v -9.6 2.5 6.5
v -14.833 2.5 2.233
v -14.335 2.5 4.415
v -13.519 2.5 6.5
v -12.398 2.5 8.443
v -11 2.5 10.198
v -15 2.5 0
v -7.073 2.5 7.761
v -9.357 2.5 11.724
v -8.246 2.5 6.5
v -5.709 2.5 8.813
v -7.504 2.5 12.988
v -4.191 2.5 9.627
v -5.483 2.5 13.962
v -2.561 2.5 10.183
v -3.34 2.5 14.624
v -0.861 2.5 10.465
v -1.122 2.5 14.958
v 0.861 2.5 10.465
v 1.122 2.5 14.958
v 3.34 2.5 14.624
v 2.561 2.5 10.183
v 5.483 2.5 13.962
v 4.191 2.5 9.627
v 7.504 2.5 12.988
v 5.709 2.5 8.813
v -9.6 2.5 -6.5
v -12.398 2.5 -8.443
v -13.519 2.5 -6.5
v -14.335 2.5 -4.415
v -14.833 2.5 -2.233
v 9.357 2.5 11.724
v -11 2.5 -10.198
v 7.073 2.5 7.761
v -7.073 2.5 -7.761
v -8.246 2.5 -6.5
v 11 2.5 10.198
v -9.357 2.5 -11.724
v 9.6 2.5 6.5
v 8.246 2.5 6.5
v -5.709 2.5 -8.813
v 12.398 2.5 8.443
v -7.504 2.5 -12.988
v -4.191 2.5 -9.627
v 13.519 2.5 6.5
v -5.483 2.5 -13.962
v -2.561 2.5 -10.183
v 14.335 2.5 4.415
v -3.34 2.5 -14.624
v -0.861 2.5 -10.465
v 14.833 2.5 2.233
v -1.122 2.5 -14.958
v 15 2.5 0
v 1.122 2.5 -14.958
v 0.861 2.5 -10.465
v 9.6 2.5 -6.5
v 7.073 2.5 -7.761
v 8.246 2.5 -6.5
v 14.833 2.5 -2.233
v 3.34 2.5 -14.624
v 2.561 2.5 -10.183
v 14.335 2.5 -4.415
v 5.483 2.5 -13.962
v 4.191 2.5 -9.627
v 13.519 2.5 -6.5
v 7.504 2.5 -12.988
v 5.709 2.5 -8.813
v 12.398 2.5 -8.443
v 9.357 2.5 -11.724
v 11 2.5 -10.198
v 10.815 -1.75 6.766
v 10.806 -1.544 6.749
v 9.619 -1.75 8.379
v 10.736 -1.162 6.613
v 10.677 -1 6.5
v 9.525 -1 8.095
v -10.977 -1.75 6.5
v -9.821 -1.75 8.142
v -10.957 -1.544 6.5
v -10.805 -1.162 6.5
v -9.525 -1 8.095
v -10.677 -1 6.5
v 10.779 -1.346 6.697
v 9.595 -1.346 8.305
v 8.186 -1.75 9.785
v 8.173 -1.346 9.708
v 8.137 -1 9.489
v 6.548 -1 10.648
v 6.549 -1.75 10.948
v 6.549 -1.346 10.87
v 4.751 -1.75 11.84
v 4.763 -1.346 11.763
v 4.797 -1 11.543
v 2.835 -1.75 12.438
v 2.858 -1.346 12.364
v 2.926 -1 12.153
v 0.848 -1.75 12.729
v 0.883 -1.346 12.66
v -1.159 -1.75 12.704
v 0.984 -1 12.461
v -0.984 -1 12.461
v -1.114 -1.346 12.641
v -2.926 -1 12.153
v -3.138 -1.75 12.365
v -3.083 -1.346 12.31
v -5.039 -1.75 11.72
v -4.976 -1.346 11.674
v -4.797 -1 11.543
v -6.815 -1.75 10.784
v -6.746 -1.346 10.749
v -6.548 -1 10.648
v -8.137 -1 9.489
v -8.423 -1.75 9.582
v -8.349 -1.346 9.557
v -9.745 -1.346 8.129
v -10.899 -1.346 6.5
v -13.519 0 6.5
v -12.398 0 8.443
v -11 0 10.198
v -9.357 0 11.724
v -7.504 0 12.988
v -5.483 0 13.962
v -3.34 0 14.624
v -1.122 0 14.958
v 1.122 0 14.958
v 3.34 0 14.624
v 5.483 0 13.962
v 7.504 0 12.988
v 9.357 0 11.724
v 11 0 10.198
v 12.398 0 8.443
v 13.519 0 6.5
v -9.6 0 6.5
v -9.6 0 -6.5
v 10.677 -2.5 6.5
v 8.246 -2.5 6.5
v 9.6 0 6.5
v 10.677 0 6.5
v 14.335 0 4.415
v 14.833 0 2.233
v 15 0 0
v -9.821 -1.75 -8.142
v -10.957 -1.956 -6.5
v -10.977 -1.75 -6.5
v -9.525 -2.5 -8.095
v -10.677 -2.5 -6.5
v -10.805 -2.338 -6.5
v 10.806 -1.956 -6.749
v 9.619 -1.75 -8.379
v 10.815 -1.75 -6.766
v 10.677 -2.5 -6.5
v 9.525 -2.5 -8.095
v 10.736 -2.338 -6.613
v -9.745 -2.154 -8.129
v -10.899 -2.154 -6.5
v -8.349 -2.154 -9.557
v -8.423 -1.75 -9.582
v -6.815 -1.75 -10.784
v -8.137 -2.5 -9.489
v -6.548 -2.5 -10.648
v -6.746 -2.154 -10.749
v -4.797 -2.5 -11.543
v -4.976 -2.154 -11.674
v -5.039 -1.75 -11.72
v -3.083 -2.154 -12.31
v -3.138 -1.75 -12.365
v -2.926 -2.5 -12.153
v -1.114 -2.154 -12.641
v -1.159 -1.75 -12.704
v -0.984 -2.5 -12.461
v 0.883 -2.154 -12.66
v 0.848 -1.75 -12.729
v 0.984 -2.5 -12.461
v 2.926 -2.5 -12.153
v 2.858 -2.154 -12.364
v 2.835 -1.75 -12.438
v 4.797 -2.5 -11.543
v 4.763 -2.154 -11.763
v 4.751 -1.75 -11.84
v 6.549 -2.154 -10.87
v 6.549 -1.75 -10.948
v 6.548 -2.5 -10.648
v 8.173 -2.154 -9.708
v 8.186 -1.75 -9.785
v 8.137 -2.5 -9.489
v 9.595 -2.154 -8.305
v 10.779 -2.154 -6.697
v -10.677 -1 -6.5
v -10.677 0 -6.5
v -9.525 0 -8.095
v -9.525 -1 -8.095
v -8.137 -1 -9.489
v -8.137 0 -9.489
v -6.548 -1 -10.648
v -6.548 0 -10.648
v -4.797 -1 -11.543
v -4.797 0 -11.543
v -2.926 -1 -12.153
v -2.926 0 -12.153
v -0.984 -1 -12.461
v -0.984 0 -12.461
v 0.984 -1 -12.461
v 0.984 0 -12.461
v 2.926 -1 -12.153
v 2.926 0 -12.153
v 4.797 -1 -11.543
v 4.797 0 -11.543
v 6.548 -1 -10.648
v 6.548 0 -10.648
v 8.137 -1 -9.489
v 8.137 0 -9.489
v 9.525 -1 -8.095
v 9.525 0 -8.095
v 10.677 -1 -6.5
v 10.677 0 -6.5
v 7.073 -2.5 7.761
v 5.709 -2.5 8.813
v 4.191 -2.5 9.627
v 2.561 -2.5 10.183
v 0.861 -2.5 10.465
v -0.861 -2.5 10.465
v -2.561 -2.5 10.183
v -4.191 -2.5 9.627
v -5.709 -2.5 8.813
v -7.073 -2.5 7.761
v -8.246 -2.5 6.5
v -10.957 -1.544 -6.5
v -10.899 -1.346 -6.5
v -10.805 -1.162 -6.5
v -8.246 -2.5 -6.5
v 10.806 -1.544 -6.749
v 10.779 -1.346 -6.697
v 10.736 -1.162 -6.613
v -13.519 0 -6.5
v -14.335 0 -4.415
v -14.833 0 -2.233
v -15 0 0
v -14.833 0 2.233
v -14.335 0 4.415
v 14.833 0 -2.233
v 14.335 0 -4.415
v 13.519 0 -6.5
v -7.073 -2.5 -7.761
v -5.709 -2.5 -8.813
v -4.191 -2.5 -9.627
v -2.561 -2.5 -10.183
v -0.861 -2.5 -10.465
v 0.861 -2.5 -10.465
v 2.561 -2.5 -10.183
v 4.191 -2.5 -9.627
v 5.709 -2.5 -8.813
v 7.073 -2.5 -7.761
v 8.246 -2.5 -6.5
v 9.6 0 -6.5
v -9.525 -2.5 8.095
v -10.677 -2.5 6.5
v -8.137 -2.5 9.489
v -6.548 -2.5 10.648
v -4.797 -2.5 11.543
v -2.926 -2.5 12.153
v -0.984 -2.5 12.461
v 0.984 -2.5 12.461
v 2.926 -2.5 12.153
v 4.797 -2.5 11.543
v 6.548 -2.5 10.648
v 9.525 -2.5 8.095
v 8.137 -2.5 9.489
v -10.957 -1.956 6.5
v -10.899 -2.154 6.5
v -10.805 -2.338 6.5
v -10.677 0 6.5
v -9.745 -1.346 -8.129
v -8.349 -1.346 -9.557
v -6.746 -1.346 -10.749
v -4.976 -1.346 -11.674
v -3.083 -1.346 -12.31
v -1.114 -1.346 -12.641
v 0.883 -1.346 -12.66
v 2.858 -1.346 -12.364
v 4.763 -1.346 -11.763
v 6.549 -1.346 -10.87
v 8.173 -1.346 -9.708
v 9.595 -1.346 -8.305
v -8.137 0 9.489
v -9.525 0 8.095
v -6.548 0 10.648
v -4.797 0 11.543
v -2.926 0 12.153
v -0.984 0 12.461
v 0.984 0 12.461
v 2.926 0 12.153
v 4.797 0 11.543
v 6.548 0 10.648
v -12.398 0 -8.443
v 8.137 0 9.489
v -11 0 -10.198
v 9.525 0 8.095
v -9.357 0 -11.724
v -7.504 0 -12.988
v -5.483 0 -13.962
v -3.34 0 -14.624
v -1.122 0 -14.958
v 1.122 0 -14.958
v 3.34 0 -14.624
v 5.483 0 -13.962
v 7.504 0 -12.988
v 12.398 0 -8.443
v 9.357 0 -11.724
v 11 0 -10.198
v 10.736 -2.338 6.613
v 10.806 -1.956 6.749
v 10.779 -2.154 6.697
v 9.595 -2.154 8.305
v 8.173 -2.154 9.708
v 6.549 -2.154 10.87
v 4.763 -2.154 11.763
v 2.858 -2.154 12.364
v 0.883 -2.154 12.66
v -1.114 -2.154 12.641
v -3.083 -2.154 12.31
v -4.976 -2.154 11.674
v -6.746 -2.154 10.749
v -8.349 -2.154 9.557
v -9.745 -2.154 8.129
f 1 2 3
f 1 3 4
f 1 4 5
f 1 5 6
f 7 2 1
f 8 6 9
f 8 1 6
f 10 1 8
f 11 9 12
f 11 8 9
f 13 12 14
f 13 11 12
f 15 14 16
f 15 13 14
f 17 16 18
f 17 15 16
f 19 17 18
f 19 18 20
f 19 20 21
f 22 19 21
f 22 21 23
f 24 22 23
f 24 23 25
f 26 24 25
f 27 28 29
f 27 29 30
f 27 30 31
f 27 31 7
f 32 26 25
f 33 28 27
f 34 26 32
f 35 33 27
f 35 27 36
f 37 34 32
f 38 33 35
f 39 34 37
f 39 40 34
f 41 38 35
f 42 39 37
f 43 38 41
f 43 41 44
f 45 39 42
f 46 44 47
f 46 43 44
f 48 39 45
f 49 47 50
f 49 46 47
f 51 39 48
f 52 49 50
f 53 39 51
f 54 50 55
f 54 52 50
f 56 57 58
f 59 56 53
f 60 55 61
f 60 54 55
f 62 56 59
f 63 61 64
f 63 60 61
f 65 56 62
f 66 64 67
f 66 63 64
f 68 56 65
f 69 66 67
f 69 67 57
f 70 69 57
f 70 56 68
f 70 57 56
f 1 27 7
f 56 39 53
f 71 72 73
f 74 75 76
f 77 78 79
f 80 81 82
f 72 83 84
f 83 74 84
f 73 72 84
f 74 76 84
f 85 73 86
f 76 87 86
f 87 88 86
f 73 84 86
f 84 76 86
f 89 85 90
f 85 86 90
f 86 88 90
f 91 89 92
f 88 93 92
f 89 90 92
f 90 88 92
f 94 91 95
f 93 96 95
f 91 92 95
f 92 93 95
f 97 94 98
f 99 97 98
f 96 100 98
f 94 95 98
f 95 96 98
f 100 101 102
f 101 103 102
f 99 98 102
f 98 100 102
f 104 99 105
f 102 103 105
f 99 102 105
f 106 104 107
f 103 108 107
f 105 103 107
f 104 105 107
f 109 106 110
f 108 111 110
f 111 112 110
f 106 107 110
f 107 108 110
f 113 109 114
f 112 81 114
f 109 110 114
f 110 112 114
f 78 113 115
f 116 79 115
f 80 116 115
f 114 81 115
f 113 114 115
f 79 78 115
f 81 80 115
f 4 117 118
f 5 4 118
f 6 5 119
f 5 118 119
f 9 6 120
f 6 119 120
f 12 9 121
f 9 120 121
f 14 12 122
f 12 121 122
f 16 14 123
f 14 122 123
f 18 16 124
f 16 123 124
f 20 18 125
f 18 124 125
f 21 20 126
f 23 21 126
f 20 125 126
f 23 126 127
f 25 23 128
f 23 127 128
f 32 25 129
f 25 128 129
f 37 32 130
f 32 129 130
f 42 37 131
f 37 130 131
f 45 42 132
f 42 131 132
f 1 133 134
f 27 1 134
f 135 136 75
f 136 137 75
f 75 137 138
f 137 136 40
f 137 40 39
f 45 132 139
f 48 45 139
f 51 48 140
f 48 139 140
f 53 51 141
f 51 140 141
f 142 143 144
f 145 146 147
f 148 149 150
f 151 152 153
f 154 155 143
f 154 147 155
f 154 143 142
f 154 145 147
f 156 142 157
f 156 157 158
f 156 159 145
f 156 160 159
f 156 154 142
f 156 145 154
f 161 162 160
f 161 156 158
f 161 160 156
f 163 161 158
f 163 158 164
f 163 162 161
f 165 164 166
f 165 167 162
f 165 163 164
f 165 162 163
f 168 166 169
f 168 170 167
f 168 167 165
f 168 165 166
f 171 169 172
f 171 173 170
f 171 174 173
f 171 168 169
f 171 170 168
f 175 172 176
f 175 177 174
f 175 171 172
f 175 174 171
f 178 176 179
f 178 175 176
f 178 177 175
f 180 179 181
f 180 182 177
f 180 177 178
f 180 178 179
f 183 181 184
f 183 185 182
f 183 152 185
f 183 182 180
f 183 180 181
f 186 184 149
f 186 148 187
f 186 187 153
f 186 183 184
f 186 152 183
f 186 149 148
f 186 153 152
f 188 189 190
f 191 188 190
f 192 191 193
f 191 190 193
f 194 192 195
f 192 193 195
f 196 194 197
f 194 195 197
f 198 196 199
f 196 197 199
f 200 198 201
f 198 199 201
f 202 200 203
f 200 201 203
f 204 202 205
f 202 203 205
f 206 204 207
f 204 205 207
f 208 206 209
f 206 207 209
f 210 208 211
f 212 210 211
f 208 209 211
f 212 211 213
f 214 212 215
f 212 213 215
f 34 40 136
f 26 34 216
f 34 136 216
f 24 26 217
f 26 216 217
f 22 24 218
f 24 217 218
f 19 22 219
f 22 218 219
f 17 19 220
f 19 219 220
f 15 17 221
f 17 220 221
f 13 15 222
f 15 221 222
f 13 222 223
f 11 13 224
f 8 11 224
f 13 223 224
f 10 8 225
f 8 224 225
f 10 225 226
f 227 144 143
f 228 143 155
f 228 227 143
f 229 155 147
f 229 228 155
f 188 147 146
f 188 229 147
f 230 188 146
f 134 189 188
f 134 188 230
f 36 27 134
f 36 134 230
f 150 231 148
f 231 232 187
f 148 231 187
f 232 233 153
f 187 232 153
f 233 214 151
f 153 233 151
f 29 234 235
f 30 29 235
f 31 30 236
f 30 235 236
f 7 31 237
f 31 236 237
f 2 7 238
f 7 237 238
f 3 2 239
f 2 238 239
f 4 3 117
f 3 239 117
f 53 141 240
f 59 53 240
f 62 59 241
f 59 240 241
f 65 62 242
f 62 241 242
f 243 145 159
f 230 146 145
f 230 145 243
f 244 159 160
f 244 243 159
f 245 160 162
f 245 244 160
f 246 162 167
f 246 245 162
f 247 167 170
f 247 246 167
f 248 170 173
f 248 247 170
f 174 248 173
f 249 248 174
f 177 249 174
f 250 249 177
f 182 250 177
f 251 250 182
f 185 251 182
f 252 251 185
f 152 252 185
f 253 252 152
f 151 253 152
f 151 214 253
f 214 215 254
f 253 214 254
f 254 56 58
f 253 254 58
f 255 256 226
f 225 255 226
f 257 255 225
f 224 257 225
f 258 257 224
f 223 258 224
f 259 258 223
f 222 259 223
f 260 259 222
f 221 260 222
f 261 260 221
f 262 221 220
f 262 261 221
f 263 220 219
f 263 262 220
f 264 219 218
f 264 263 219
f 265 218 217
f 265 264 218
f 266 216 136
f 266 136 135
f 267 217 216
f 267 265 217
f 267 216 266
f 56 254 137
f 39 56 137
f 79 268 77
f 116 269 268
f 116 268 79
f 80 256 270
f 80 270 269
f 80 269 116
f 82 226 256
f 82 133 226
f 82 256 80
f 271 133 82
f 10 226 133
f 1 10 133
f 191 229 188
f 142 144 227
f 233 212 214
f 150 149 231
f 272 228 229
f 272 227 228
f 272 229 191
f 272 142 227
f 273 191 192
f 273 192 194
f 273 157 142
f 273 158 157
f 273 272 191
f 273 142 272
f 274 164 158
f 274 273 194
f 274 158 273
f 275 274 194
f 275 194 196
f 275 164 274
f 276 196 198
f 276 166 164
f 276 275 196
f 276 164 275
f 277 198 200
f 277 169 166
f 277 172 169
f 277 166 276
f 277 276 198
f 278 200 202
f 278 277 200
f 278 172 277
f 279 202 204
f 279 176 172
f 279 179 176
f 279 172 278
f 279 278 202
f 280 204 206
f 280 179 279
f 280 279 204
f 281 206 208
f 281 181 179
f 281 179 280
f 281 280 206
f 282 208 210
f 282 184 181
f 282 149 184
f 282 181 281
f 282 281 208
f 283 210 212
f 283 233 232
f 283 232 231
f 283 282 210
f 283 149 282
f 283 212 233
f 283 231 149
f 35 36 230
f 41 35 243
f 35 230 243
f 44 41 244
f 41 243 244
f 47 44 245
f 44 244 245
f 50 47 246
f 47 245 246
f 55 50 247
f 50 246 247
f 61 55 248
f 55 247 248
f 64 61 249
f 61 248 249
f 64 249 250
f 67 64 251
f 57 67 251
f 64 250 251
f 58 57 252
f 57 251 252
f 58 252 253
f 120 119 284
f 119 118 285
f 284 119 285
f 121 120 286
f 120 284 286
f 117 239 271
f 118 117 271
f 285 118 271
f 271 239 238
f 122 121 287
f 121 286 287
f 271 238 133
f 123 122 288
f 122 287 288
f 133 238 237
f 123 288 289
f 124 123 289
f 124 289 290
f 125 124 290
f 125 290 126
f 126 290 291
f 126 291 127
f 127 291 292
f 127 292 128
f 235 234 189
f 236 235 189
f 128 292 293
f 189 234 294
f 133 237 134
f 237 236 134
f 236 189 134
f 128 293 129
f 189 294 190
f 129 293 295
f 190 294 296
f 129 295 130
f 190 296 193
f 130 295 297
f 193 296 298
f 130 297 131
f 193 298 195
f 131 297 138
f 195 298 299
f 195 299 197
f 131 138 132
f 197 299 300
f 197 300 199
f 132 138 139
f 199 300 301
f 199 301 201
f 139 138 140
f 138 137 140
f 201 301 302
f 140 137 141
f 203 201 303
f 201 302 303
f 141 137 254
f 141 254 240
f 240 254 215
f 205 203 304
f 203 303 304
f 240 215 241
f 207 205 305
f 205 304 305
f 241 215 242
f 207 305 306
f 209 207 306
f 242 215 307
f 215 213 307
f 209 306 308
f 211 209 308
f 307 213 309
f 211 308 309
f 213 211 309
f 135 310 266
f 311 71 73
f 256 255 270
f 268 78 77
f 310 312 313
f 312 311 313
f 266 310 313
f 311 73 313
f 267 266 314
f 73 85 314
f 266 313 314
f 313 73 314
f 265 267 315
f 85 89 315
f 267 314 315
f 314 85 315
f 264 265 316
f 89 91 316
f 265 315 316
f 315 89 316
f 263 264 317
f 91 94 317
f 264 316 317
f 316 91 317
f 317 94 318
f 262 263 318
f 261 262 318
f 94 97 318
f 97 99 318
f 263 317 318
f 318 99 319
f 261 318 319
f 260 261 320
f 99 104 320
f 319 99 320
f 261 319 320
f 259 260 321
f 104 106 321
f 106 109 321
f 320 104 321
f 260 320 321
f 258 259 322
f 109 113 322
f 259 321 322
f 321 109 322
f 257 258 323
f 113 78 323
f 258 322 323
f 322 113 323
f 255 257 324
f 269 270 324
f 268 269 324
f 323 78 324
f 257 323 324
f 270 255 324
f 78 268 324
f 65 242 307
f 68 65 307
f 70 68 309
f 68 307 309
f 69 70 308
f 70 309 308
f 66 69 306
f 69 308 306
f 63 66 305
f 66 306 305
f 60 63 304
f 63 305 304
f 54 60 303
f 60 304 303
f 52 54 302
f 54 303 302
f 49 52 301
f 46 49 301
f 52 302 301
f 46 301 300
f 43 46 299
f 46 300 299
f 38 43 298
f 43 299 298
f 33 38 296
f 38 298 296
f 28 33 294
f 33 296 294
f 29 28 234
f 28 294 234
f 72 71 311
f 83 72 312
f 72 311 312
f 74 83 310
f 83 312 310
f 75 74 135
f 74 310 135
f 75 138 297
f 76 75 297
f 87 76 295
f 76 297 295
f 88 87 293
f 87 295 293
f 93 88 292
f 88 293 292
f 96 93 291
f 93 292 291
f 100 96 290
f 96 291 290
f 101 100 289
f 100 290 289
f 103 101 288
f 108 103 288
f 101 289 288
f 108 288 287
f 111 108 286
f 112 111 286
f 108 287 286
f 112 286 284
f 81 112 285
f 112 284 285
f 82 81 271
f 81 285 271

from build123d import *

# Parameters (mm, degrees)
SKETCH1_R               = 15.000000000000009
BOSS_EXTRUDE1_DEPTH     = 2.5
BOSS_EXTRUDE2_DEPTH     = 2.5
CUT_EXTRUDE1_DEPTH      = 22.360009363293848
CUT_EXTRUDE1_DEPTH_BACK = 22.360009363293848


with BuildPart() as part:
    # Sketch1 → Boss-Extrude1 (new body)
    with BuildSketch(Plane(origin=(0, 0, 0), x_dir=(1, 0, 0), z_dir=(0, 1, 0))):
        Circle(SKETCH1_R)
        Polygon((-9.600000000000001, 6.500000000000001), (9.599999999999998, 6.500000000000001), (9.600000000000001, -6.499999999999999), (-9.6, -6.499999999999999), align=None, mode=Mode.SUBTRACT)
    extrude(amount=BOSS_EXTRUDE1_DEPTH)

    # Sketch2 → Boss-Extrude2 (add)
    with BuildSketch(Plane.XZ):
        with BuildLine():
            ThreePointArc((10.677078252031343, 6.499999999999946), (1.9505e-13, 12.5), (-10.677078252031139, 6.5000000000002816))
            Line((-10.677078252031041, 6.500000000000222), (-8.246211251235344, 6.499999999999985))
            ThreePointArc((-8.246211251235334, 6.499999999999984), (9.623e-14, 10.5), (8.246211251235454, 6.499999999999831))
            Line((8.246211251235511, 6.499999999999877), (10.677078252031361, 6.499999999999957))
        make_face()
        with BuildLine():
            Line((-8.24621125123534, -6.499999999999991), (-10.67707825203104, -6.500000000000227))
            ThreePointArc((-10.677078252031139, -6.500000000000285), (1.9754e-13, -12.5), (10.677078252031343, -6.499999999999948))
            Line((10.677078252031361, -6.499999999999961), (8.246211251235515, -6.499999999999878))
            ThreePointArc((8.24621125123545, -6.499999999999835), (9.133e-14, -10.5), (-8.246211251235332, -6.499999999999985))
        make_face()
    extrude(amount=BOSS_EXTRUDE2_DEPTH)

    # Sketch2<3> → Cut-Extrude1 (cut, two sides: drawn at the far end of the back side and taken through both)
    with BuildSketch(Plane.XZ.offset(-CUT_EXTRUDE1_DEPTH_BACK)):
        with BuildLine():
            ThreePointArc((8.246211251235135, 6.500000000000237), (-8.68e-15, 10.5), (-8.246211251235145, 6.500000000000222))
            Line((-8.246211251235067, 6.499999999999999), (8.24621125123505, 6.499999999999999))
        make_face()
        with BuildLine():
            Line((8.246211251235048, -6.500000000000003), (-8.246211251235064, -6.500000000000003))
            ThreePointArc((-8.246211251235142, -6.5000000000002265), (-1.125e-14, -10.5), (8.24621125123513, -6.500000000000245))
        make_face()
    extrude(amount=CUT_EXTRUDE1_DEPTH + CUT_EXTRUDE1_DEPTH_BACK, mode=Mode.SUBTRACT)

    # Sweep2: sweep along a curve in space
    with BuildLine() as sweep2_path:
        ThreePointArc((10.677078252031313, -2.5, 6.499999999999999), (-1.78e-15, -2.5, 12.5), (-10.677078252031313, -2.5, 6.499999999999999))
    # Sketch4 → Sweep2 (sweep)
    with BuildSketch(Plane(origin=(2.88e-15, 0, 6.499999999999995), x_dir=(-1, 0, 4.4e-16), z_dir=(-4.4e-16, 0, -1))):
        with BuildLine():
            Line((10.677078252031317, -2.5), (10.677078252031317, -1))
            ThreePointArc((10.677078252031317, -1), (10.899296653369037, -1.3461126394649119), (10.977078252031317, -1.75))
            ThreePointArc((10.977078252031317, -1.75), (10.899296653369037, -2.153887360535088), (10.677078252031317, -2.5))
        make_face()
    sweep(path=sweep2_path.line)

    # Sweep4: sweep along a curve in space
    with BuildLine() as sweep4_path:
        ThreePointArc((-10.677078252031311, -2.5, -6.500000000000003), (0, -2.5, -12.500000000000002), (10.677078252031311, -2.5, -6.500000000000003))
    # Sketch11 → Sweep4 (sweep)
    with BuildSketch(Plane.XY.offset(-6.500000000000005)):
        with BuildLine():
            Line((-10.677078252031315, -2.5), (-10.677078252031315, -1))
            ThreePointArc((-10.677078252031315, -1), (-10.899296653369035, -1.3461126394649117), (-10.977078252031315, -1.7499999999999998))
            ThreePointArc((-10.977078252031315, -1.7499999999999998), (-10.899296653369035, -2.1538873605350877), (-10.677078252031315, -2.5))
        make_face()
    sweep(path=sweep4_path.line)


solid = part.part
